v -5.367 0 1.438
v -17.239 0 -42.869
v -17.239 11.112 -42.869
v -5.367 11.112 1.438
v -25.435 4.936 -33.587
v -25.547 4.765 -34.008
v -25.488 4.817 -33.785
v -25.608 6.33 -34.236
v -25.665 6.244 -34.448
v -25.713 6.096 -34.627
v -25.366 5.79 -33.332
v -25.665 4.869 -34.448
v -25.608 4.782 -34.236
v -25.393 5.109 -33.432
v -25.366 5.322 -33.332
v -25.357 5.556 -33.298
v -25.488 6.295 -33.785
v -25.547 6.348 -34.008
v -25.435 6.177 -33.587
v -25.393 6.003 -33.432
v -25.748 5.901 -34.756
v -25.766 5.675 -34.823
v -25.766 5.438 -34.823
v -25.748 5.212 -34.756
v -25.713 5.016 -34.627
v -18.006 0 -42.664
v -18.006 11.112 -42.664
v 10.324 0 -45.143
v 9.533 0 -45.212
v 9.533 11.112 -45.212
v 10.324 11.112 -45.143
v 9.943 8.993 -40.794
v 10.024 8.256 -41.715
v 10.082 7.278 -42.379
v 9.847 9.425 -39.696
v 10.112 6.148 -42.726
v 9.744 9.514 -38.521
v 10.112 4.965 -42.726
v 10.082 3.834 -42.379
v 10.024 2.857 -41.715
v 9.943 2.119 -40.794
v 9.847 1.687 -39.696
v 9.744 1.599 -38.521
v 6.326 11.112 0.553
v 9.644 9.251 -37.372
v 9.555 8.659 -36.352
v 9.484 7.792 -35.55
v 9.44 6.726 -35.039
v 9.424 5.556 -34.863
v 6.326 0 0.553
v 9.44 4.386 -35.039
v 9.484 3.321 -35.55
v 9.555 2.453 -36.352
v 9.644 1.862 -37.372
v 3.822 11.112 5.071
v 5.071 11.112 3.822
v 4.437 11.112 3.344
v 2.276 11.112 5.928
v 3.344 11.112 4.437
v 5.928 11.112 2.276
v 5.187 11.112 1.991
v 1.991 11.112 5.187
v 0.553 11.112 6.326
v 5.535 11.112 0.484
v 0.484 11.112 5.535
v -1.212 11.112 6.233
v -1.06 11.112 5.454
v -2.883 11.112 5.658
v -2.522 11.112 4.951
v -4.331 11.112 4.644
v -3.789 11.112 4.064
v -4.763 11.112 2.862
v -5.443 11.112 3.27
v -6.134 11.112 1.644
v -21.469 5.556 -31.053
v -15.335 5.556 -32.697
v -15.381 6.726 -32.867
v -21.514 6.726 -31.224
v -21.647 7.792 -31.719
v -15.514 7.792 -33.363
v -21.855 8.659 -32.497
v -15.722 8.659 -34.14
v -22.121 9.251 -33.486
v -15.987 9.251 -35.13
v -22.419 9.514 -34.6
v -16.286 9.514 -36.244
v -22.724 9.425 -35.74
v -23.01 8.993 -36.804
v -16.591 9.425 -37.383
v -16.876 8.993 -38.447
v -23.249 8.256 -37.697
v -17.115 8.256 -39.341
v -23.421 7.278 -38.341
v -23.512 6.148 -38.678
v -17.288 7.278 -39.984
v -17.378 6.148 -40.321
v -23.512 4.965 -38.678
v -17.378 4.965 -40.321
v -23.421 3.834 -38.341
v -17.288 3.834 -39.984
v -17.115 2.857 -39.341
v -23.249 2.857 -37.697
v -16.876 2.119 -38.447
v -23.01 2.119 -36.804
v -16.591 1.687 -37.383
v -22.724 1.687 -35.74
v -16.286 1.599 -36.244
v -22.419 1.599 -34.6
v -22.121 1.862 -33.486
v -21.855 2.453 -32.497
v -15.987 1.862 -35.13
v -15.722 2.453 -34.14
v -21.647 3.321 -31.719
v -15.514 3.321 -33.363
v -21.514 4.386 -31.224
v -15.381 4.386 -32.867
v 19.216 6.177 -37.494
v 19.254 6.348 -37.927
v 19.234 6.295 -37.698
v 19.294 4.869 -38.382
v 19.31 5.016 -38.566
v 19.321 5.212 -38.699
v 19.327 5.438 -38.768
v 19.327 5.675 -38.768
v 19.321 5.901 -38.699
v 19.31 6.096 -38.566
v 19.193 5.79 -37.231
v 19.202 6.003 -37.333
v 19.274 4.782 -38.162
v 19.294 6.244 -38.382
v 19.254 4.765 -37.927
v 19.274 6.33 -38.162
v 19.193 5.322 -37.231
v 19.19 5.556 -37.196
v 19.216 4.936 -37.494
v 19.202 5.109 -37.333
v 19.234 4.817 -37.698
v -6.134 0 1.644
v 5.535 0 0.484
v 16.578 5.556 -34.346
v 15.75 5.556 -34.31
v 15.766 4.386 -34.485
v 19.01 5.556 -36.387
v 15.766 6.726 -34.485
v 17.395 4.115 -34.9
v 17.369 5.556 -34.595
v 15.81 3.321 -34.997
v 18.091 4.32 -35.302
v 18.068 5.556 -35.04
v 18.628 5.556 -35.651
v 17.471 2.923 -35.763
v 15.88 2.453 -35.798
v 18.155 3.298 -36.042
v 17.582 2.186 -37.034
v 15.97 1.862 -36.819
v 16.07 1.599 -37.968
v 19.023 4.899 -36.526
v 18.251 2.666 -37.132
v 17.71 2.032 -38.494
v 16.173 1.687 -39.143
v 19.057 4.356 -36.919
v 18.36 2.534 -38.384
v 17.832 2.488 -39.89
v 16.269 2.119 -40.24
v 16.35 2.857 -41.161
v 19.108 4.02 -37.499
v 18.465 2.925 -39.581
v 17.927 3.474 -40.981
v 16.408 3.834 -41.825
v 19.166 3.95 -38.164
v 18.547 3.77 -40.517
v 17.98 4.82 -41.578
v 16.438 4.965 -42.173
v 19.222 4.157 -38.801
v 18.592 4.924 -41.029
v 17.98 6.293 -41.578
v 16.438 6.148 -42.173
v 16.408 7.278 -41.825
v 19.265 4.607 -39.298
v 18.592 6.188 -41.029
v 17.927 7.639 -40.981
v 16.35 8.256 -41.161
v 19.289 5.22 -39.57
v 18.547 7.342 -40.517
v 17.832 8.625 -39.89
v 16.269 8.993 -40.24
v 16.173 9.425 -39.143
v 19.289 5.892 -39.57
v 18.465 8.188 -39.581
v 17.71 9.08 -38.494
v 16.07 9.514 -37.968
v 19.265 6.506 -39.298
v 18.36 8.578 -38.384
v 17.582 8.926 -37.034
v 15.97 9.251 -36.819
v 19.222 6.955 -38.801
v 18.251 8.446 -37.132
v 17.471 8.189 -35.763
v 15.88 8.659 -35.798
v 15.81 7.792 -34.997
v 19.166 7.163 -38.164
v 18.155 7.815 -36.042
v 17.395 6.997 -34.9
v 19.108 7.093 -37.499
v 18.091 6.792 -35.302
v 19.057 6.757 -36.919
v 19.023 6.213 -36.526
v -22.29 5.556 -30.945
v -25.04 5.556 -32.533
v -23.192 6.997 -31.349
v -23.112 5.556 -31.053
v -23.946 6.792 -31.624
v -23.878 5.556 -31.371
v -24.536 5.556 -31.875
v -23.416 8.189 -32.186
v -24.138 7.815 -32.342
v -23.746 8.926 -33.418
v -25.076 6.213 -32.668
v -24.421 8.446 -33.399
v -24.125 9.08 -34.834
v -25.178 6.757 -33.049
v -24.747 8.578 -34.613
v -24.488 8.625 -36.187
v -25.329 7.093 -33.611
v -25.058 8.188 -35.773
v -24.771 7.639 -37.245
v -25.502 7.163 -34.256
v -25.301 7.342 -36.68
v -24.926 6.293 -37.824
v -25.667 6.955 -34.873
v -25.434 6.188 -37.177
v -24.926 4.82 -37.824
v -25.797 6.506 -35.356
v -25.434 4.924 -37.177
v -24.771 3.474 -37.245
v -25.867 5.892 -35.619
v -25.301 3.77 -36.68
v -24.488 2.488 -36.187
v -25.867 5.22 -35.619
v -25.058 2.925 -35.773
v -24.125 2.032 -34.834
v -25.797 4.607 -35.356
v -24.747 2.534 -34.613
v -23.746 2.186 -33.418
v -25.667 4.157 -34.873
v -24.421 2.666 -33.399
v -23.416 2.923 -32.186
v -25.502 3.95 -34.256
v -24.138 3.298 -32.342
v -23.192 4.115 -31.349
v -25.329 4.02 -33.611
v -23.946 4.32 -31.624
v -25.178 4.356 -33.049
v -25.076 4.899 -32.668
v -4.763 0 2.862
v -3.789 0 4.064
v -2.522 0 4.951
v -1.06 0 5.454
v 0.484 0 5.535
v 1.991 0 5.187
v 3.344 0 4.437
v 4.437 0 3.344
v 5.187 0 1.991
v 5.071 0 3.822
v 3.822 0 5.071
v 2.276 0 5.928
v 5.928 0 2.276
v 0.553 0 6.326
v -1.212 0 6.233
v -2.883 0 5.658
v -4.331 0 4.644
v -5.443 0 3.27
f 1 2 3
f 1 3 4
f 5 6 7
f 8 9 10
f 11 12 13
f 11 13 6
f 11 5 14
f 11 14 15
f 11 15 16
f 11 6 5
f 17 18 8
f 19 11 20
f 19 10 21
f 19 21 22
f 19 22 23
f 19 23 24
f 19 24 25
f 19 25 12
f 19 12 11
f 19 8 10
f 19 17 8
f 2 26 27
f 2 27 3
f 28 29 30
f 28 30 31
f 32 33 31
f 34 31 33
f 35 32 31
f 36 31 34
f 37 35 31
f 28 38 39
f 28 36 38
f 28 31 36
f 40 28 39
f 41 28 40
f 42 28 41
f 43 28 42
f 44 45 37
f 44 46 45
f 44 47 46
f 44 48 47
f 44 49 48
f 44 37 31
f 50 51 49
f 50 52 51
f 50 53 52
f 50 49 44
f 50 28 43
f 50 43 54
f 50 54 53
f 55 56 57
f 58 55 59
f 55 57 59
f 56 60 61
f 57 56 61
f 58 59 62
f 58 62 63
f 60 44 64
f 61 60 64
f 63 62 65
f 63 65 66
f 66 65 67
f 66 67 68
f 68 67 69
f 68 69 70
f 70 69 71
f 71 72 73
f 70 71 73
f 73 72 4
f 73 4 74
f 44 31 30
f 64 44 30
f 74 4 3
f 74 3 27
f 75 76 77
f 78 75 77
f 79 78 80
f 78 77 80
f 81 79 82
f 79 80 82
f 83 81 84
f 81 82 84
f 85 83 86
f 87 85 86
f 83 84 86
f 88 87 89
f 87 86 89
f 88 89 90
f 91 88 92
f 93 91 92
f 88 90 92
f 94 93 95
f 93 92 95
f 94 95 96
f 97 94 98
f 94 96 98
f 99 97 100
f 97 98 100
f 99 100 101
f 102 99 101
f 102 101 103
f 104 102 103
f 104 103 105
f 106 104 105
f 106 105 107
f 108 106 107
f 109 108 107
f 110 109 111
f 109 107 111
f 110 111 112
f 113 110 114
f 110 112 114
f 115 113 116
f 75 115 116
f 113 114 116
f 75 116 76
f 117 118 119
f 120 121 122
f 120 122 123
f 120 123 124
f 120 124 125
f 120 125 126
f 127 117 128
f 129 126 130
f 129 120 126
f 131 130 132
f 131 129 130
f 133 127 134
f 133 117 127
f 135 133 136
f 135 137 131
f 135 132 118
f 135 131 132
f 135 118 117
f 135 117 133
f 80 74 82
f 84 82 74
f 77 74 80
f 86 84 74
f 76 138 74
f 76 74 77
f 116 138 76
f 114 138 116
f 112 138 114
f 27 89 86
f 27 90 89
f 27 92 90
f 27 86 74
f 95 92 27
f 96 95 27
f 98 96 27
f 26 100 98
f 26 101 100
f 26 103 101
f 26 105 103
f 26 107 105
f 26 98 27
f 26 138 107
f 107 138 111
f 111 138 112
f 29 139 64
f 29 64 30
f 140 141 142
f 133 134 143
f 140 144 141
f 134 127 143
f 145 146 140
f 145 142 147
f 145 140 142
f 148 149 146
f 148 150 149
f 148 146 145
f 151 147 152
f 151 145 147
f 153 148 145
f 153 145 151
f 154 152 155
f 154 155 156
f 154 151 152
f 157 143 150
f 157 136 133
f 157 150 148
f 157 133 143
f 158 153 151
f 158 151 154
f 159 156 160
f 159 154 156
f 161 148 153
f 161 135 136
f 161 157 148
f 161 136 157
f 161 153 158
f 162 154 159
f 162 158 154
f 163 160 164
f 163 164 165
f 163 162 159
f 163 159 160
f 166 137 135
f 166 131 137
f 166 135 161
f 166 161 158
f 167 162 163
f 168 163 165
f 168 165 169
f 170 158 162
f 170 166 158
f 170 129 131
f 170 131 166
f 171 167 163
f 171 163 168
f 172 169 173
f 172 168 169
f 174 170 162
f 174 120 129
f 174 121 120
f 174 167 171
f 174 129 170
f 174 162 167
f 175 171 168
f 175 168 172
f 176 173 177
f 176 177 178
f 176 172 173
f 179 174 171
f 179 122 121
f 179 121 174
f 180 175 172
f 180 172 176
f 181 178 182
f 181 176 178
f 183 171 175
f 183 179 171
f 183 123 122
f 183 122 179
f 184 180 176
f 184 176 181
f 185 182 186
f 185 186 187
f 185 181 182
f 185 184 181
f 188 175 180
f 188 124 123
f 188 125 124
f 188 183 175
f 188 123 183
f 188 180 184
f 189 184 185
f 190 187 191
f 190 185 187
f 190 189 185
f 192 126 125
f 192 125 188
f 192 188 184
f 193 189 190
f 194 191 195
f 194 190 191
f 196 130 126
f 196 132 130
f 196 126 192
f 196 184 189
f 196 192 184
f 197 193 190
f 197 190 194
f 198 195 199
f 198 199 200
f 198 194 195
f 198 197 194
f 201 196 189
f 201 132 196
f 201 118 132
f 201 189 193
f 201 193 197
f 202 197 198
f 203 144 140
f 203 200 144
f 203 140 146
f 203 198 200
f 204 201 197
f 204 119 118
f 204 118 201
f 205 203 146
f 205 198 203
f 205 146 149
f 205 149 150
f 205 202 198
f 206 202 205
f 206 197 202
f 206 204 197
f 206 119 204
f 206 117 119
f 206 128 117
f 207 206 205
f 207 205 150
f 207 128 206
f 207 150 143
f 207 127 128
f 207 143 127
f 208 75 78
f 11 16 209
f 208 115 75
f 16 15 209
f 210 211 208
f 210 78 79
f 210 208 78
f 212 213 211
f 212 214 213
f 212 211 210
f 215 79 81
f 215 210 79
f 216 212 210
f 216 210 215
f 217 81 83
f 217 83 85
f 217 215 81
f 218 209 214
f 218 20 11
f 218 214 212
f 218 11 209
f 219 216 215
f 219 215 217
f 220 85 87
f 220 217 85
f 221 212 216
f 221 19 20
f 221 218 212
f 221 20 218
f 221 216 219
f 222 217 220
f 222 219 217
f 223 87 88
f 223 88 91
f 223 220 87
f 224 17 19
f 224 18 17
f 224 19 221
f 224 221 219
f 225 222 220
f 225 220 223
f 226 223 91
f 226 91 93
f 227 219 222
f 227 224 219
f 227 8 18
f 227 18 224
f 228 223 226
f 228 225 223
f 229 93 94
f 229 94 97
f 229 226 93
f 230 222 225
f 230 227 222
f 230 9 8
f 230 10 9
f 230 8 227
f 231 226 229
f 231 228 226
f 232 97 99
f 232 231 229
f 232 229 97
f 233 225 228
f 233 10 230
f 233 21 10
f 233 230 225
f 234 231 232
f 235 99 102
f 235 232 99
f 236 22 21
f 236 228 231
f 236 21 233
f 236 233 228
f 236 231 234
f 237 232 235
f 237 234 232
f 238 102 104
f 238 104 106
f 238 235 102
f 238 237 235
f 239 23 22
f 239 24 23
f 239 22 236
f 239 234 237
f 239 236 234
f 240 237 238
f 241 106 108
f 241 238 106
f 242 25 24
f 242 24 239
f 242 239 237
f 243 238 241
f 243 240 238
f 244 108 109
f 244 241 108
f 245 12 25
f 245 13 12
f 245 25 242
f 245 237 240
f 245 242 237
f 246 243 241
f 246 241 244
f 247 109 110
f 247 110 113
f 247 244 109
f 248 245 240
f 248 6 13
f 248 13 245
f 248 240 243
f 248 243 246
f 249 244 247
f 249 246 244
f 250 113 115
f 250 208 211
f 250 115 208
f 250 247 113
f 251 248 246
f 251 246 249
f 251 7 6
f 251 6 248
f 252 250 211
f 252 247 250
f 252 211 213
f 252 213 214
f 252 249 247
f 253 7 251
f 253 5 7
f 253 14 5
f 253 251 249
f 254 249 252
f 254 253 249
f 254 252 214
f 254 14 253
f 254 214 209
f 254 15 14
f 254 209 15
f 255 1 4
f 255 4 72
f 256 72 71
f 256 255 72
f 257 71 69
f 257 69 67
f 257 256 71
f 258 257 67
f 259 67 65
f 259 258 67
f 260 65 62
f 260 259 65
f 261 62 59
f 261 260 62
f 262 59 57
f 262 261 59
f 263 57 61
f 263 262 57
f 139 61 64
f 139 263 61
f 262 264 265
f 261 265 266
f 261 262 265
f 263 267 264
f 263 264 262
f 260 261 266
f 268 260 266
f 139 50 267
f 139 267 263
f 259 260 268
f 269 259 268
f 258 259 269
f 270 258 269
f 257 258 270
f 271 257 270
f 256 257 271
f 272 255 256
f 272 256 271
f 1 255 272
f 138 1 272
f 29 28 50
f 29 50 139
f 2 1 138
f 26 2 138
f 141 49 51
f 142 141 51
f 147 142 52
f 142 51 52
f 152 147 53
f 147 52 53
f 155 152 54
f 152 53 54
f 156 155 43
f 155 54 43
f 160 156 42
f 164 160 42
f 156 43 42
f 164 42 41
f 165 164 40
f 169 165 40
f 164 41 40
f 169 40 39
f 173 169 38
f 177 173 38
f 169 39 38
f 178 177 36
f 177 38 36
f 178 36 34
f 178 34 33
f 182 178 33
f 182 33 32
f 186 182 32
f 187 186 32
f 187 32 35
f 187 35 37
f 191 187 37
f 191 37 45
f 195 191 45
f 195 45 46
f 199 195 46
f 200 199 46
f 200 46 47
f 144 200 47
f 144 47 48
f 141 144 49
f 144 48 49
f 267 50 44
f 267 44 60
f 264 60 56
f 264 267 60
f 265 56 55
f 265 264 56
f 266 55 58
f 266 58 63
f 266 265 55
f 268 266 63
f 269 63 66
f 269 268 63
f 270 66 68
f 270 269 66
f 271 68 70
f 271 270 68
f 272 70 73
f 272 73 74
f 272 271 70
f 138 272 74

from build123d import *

# Parameters (mm, degrees)
BOSS_EXTRUDE1_DEPTH = 11.1125
SKETCH2_R           = 3.96875
BOSS_EXTRUDE2_DEPTH = 9.525
SKETCH4_R           = 3.96875
BOSS_EXTRUDE3_DEPTH = 9.525
FILLET1_R           = 3.175


with BuildPart() as part:
    # Sketch1 → Boss-Extrude1 (new body)
    with BuildSketch(Plane(origin=(0, 0, 0), x_dir=(1, 0, 0), z_dir=(0, 1, 0))):
        with BuildLine():
            Line((-6.133628997, -1.643500936), (-18.005791029, 42.664010964))
            Line((-18.005791029, 42.664010964), (-17.239087405, 42.869448581))
            Line((-17.239087405, 42.869448581), (-5.366925372, -1.438063319))
            ThreePointArc((-5.366925372, -1.438063319), (0.484259096, -5.535106791), (5.535106791, -0.484259096))
            Line((5.535106791, -0.484259096), (9.532985307, 45.211701443))
            Line((9.532985307, 45.211701443), (10.323714849, 45.142521572))
            Line((10.323714849, 45.142521572), (6.325836333, -0.553438966))
            ThreePointArc((6.325836333, -0.553438966), (0.553438966, -6.325836333), (-6.133628997, -1.643500936))
        make_face()
    extrude(amount=BOSS_EXTRUDE1_DEPTH)

    # Sketch2 → Boss-Extrude2 (add)
    with BuildSketch(Plane(origin=(6.325836333, 0, 0.553438966), x_dir=(0.08715574274765789, 0, -0.9961946980917457), z_dir=(0.9961946980917457, 0, 0.08715574274765789))):
        with Locations(Location((39.520511684, 5.55625, 0), (0, 0, 180))):
            Circle(SKETCH2_R)
    extrude(amount=BOSS_EXTRUDE2_DEPTH)

    # Sketch4 → Boss-Extrude3 (add)
    with BuildSketch(Plane(origin=(-6.133628997, 0, 1.643500936), x_dir=(0.2588190451025218, 0, 0.9659258262890681), z_dir=(-0.9659258262890681, 0, 0.2588190451025218))):
        with Locations((-39.520511684, 5.55625)):
            Circle(SKETCH4_R)
    extrude(amount=BOSS_EXTRUDE3_DEPTH)

    # Fillet1
    fillet1_edges = [part.edges().sort_by_distance(p)[0] for p in [
        (19.604929736, 5.55625, -41.940174498),
        (-26.589921674, 5.55625, -37.898648686),
    ]]
    fillet(fillet1_edges, radius=FILLET1_R)


solid = part.part
